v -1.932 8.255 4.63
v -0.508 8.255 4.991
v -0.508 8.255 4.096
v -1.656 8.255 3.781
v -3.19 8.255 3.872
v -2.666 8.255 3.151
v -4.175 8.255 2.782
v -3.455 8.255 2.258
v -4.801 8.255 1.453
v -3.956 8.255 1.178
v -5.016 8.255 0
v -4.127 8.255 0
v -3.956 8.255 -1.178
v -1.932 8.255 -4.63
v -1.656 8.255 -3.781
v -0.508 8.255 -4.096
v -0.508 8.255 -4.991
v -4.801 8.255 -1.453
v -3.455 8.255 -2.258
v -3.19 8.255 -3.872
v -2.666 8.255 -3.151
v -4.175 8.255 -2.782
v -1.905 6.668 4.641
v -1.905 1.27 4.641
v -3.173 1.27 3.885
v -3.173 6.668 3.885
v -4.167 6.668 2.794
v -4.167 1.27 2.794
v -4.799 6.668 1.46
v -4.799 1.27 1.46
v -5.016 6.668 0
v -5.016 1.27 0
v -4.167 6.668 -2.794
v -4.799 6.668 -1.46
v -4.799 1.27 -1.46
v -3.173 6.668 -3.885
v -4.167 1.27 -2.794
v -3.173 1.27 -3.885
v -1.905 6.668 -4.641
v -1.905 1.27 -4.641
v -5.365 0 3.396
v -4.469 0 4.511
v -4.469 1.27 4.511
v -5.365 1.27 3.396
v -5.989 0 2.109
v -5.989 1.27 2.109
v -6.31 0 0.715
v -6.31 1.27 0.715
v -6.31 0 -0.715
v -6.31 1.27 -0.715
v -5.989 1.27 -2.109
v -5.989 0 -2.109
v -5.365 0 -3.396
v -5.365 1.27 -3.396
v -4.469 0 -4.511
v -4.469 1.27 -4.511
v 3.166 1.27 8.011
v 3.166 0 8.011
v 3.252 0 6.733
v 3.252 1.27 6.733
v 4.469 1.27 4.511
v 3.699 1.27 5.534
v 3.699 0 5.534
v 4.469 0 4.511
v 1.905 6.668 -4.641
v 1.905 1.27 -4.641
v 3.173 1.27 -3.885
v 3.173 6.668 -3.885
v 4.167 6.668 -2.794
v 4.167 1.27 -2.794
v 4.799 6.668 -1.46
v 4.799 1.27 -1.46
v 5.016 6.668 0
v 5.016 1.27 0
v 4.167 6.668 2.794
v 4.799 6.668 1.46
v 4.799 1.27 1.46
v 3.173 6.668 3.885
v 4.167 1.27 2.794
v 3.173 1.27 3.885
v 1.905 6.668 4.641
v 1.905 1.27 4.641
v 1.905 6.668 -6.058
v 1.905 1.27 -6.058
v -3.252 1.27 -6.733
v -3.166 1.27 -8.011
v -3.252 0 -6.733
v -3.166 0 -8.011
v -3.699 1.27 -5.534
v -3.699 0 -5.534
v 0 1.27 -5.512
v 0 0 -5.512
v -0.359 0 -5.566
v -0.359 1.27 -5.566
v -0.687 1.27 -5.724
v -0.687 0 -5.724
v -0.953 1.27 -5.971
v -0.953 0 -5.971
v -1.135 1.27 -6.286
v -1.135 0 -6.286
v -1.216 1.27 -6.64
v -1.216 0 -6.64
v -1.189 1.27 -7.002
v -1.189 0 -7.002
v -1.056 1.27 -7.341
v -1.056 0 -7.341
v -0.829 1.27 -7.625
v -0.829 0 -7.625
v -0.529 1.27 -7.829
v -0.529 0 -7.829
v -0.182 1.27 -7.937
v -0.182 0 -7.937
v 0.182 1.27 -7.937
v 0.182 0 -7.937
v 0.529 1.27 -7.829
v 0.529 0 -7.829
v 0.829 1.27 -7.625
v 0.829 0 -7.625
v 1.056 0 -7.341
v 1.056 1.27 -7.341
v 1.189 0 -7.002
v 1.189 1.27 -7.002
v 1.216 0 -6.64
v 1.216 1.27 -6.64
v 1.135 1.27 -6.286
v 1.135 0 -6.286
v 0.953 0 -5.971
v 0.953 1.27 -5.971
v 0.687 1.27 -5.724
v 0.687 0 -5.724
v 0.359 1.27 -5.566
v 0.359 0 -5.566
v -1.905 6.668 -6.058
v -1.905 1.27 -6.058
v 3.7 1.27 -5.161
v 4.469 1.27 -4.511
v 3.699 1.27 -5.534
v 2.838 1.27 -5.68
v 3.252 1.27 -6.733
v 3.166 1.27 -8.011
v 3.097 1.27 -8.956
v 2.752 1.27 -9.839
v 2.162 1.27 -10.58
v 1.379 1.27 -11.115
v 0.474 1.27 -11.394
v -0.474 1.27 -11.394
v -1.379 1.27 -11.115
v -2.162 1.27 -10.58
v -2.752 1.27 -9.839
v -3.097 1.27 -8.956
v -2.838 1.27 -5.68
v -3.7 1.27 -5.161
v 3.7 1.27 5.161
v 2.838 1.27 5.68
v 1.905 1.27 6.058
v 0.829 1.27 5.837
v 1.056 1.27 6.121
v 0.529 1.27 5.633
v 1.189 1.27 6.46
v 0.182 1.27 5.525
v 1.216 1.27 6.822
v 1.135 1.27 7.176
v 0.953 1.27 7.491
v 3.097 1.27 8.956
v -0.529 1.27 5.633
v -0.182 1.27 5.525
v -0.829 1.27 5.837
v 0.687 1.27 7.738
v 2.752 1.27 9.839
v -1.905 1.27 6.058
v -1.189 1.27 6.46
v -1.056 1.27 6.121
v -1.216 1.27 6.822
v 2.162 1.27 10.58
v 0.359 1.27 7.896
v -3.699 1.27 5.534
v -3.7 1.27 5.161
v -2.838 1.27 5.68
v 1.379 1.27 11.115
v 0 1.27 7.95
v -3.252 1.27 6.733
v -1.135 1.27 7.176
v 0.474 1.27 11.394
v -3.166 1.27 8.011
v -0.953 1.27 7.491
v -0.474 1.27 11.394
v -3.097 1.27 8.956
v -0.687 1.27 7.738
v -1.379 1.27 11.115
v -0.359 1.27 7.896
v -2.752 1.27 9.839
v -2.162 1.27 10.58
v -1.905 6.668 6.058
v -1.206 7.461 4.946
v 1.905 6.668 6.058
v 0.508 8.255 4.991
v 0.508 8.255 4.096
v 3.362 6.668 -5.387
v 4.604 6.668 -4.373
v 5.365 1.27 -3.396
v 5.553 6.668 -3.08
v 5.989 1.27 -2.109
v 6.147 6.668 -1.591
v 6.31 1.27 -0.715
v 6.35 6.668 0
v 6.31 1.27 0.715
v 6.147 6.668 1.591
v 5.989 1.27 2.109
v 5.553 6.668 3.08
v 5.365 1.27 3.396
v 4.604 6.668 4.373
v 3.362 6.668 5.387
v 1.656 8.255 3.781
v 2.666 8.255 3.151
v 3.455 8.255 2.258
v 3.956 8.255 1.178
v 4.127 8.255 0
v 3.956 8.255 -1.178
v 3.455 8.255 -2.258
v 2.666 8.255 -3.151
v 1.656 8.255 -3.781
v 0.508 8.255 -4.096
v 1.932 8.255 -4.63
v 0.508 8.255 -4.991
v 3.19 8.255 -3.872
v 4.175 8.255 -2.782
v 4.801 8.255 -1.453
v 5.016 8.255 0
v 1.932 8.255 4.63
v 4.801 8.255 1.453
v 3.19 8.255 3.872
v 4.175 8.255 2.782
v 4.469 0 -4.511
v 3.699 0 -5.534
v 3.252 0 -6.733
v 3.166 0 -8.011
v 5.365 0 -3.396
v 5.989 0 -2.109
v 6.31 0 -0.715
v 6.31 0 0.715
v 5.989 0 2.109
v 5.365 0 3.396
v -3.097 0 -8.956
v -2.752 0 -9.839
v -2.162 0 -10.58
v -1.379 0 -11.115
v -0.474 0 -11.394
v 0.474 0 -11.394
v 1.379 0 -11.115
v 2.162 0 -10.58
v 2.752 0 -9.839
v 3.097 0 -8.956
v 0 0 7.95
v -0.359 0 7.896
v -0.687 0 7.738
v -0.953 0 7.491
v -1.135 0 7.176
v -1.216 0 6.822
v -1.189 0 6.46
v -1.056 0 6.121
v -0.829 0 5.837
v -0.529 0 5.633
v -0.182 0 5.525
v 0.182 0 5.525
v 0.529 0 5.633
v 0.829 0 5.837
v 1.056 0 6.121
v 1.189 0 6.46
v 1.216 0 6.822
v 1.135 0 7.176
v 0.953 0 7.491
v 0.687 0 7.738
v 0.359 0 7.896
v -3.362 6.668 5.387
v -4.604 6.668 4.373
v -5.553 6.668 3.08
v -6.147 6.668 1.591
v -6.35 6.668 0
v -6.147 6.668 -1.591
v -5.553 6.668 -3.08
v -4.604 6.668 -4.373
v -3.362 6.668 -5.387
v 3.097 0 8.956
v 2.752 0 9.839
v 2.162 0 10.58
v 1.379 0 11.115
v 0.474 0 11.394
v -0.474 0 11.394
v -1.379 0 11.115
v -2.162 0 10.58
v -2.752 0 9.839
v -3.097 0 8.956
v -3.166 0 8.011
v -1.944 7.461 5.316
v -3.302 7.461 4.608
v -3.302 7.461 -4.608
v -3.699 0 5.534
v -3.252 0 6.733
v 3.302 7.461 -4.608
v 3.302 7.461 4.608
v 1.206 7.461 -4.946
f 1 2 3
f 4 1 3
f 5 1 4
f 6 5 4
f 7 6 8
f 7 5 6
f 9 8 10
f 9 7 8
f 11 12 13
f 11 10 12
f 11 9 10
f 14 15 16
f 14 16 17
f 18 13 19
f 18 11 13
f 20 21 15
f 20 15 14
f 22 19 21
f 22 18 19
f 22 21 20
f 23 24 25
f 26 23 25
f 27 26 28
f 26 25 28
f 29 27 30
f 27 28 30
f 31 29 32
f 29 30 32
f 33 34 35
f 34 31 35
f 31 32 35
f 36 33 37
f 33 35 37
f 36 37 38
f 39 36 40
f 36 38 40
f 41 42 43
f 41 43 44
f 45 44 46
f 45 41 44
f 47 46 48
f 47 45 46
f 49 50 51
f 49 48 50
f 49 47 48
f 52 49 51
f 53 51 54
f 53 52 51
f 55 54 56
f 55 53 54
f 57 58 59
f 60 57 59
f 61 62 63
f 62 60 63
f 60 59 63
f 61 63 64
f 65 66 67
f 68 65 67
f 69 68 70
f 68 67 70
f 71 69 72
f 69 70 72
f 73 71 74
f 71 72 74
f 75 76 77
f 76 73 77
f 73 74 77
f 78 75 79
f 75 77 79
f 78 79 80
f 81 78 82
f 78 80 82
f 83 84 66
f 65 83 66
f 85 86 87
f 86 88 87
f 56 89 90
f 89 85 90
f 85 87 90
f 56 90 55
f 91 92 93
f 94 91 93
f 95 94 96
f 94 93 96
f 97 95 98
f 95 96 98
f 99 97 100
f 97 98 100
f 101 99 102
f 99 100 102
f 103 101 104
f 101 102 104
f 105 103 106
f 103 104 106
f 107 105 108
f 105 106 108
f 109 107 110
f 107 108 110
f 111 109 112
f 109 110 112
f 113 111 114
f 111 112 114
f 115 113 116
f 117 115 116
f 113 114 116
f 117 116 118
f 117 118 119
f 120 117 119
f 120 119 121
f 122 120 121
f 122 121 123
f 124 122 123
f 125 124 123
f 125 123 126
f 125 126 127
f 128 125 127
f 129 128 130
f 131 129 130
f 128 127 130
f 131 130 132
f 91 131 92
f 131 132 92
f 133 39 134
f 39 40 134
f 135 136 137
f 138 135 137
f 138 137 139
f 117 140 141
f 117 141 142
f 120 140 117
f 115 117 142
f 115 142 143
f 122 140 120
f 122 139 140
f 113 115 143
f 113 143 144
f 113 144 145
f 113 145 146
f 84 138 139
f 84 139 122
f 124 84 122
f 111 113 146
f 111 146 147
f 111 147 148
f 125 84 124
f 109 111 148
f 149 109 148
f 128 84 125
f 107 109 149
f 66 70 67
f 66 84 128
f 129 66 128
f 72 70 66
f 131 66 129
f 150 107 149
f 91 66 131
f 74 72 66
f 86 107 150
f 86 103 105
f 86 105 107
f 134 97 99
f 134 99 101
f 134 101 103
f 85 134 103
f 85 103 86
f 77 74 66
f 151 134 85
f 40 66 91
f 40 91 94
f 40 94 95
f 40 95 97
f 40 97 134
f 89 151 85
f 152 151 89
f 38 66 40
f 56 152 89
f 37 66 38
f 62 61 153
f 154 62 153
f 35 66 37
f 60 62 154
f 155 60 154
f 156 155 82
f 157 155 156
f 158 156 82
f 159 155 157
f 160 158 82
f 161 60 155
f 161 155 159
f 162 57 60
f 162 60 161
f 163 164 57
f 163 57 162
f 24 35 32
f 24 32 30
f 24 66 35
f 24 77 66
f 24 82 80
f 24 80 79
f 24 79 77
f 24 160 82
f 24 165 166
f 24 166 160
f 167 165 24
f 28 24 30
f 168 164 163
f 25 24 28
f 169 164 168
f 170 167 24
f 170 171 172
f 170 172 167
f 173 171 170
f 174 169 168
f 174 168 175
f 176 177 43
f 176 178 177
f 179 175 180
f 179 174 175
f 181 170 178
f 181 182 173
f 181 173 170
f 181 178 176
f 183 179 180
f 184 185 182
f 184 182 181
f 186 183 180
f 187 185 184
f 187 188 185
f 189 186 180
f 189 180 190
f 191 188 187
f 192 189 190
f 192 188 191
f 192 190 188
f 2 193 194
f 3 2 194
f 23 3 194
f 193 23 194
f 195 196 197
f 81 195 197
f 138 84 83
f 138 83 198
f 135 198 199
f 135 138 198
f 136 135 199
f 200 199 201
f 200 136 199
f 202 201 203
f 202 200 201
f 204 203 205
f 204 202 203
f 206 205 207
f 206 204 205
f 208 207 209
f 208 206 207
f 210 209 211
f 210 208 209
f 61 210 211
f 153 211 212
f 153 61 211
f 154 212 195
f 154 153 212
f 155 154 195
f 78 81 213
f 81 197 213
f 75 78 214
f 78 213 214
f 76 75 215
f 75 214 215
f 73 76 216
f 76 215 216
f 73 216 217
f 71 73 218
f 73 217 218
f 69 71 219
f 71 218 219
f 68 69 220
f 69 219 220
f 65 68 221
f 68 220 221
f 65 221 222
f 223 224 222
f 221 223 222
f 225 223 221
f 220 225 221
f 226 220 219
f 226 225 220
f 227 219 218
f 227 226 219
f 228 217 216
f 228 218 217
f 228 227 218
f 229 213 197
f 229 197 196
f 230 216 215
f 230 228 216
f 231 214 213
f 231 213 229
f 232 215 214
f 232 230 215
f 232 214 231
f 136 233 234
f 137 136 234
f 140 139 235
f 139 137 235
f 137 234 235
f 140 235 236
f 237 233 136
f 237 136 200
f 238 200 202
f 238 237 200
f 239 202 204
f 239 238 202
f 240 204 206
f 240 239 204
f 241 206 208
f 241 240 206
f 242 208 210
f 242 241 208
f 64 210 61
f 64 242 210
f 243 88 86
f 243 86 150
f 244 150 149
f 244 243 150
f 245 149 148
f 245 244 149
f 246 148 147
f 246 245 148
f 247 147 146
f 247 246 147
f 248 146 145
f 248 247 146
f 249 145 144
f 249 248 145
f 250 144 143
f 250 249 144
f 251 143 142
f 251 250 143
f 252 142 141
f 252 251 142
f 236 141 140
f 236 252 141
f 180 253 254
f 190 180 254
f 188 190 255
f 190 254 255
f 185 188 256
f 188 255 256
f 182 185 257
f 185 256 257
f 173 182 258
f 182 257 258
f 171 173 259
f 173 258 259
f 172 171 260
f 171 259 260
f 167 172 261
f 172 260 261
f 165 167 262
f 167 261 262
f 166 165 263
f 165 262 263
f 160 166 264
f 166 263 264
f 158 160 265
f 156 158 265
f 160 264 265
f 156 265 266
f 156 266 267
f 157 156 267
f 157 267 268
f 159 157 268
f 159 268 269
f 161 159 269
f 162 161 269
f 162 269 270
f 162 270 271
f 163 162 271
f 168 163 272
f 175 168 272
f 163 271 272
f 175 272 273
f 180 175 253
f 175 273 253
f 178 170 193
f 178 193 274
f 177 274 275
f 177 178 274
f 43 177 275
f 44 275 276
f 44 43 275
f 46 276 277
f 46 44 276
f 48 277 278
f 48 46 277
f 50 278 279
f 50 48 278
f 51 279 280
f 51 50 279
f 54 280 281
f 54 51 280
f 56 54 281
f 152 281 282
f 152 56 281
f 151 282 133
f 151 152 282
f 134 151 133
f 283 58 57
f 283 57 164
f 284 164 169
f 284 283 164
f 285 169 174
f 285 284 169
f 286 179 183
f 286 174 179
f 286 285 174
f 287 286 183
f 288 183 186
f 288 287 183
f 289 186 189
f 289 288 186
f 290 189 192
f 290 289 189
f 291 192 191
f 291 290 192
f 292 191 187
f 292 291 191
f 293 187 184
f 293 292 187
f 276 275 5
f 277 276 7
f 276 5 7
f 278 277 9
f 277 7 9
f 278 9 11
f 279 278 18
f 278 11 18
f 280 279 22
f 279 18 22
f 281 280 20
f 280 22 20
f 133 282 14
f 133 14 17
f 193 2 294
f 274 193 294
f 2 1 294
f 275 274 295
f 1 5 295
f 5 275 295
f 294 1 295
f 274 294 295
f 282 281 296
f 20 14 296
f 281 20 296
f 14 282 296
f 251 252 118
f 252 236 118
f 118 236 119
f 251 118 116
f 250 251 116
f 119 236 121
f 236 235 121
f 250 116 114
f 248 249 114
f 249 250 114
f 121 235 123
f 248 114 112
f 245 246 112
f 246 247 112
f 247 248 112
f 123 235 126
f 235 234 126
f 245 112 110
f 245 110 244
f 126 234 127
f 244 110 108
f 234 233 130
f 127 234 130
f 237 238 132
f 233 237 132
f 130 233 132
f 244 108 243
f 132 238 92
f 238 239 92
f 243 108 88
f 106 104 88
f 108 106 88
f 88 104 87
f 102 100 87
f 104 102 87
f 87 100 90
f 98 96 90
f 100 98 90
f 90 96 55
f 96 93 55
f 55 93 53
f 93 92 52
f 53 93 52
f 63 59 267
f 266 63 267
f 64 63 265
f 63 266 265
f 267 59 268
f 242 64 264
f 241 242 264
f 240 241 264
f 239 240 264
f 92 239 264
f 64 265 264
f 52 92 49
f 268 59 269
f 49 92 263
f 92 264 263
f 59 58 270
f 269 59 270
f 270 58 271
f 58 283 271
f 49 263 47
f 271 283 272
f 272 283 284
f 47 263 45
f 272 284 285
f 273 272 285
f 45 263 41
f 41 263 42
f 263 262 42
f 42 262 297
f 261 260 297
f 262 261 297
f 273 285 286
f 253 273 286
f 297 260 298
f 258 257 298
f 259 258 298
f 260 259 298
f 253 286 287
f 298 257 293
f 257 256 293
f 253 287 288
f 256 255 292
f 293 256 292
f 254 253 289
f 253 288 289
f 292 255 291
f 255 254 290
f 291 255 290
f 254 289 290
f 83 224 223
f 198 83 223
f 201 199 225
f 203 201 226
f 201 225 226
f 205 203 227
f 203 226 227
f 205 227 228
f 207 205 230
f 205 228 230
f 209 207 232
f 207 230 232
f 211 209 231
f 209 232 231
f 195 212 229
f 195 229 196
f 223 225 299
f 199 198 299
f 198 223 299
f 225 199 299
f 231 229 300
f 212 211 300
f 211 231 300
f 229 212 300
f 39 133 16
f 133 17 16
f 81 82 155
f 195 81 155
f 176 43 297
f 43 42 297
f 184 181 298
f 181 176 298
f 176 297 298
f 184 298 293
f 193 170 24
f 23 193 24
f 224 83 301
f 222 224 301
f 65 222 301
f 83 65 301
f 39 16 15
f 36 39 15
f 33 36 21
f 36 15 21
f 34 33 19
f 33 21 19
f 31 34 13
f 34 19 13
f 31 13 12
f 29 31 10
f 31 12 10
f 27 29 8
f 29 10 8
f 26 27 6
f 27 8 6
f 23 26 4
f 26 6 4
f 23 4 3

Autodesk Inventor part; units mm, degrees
ref_plane "YZ Plane" through (0, 0, 0) normal (1, 0, 0) x (0, 1, 0)
ref_plane "XZ Plane" through (0, 0, 0) normal (0, 1, 0) x (-1, 0, 0)
sketch "Sketch1" plane through (0, 0, 0) normal (0, 1, 0) x (-1, 0, 0)
  arc A0 (-4.4691, 4.5111) -> (4.4691, 4.5111) centre (0, 0) ccw
  arc A1 (3.1656, 8.0108) -> (-3.1656, 8.0108) centre (0, 8.255) ccw
  circle A2 centre (0, -8.255) radius 3.175
  line L0 (0, 0) -> (3.175, 0)
  arc A3 (3.1656, 8.0108) -> (4.4691, 4.5111) centre (7.5974, 7.6688) ccw
  arc A4 (-4.4691, 4.5111) -> (-3.1656, 8.0108) centre (-7.5974, 7.6688) ccw
  arc A5 (-3.1656, -8.0108) -> (-4.4691, -4.5111) centre (-7.5974, -7.6688) ccw
  arc A6 (4.4691, -4.5111) -> (3.1656, -8.0108) centre (7.5974, -7.6688) ccw
  dimension "d0" = 12.7
  dimension "d2" = 6.35
  dimension "d4" = 6.35
  dimension "d5" = 8.89
  dimension "d6" = 16.51
extrude "Extrusion1" add sketch "Sketch1" along normal blind 1.27
sketch "Sketch2" plane through (0, 1.27, 0) normal (0, 1, 0) x (1, 0, 0)
  line L0 (1.905, -7.3814) -> (-1.905, -7.3814)
  line L1 (-1.905, -7.3814) -> (-1.905, 7.3814)
  line L2 (-1.905, 7.3814) -> (1.905, 7.3814)
  line L3 (1.905, 7.3814) -> (1.905, -7.3814)
  line L4 (1.905, -7.3814) -> (-1.905, 7.3814) construction
  line L5 (-1.905, -7.3814) -> (1.905, 7.3814) construction
  arc A0 (1.905, -4.6407) -> (1.905, 4.6407) centre (0, 0) ccw
  arc A1 (-1.905, 4.6407) -> (-1.905, -4.6407) centre (0, 0) ccw
  arc A2 (1.905, -6.0575) -> (1.905, 6.0575) centre (0, 0) ccw
  arc A3 (-1.905, 6.0575) -> (-1.905, -6.0575) centre (0, 0) ccw
  dimension "d11" = 3.81
  dimension "d34" = 5.0165
  dimension "d35" = 6.35
  dimension "d36" = 5.0165
  dimension "d37" = 6.35
extrude "Extrusion2" add sketch "Sketch2" along normal blind 5.3975 contours L3 A0 A2 | A3 L1 A1
sketch "Sketch3" plane through (0, 6.6675, 0) normal (0, 1, 0) x (1, 0, 0)
  arc A0 (-1.905, 4.6407) -> (-1.905, -4.6407) centre (0, 0) ccw projected
  line L0 (-1.905, 4.6407) -> (-1.905, 6.0575) projected
  arc A1 (-1.905, 6.0575) -> (-1.905, -6.0575) centre (0, 0) ccw projected
  line L1 (-1.905, -6.0575) -> (-1.905, -4.6407) projected
  line L2 (1.905, -4.6407) -> (1.905, -6.0575) projected
  arc A2 (1.905, -6.0575) -> (1.905, 6.0575) centre (0, 0) ccw projected
  line L3 (1.905, 6.0575) -> (1.905, 4.6407) projected
  arc A3 (1.905, -4.6407) -> (1.905, 4.6407) centre (0, 0) ccw projected
ref_plane "Work Plane1" through (0, 8.255, 0) normal (0, 1, 0) x (1, 0, 0)
sketch "Sketch4" plane through (0, 8.255, 0) normal (0, 1, 0) x (1, 0, 0)
  arc A0 (0.508, -4.9907) -> (0.508, 4.9907) centre (0, 0) ccw
  arc A1 (0.508, -4.0961) -> (0.508, 4.0961) centre (0, 0) ccw
  line L0 (0.508, -4.9907) -> (0.508, -4.0961)
  line L1 (0.508, 4.0961) -> (0.508, 4.9907)
sketch "Sketch5" plane through (0, 8.255, 0) normal (0, 1, 0) x (1, 0, 0)
  line L0 (-0.508, -4.0961) -> (-0.508, -4.9907) projected
  arc A0 (-0.508, 4.0961) -> (-0.508, -4.0961) centre (0, 0) ccw projected
  arc A1 (-0.508, 4.9907) -> (-0.508, -4.9907) centre (0, 0) ccw projected
  line L1 (-0.508, 4.0961) -> (-0.508, 4.9907)
loft "Loft1" add profiles "Sketch4" section 1 edges at (1.905, 6.6675, 5.3491) (6.35, 6.6675, 0) (1.905, 6.6675, -5.3491) (5.0165, 6.6675, 0)
loft "Loft2" add profiles "Sketch5" section 1 edges at (-5.0165, 6.6675, 0) (-1.905, 6.6675, -5.3491) (-6.35, 6.6675, 0) (-1.905, 6.6675, 5.3491)
sketch "Sketch6" plane through (0, 1.27, 0) normal (0, 1, 0) x (1, 0, 0)
  line L0 (0, 0) -> (-3.0006, 0)
  point P0 (0, -6.731)
  point P1 (0, 6.731)
  dimension "d26" = 13.462
hole "Hole1" at (0, 1.27, 6.731) at (0, 1.27, -6.731) direction (0, -1, 0) diameter 2.4384 end through all clearance for "Flat Head Machine Screw (82)" size "#2" standard "Ansi Unified Screw Threads"
properties part number "CasterEnclosure" material "ABS Plastic"
